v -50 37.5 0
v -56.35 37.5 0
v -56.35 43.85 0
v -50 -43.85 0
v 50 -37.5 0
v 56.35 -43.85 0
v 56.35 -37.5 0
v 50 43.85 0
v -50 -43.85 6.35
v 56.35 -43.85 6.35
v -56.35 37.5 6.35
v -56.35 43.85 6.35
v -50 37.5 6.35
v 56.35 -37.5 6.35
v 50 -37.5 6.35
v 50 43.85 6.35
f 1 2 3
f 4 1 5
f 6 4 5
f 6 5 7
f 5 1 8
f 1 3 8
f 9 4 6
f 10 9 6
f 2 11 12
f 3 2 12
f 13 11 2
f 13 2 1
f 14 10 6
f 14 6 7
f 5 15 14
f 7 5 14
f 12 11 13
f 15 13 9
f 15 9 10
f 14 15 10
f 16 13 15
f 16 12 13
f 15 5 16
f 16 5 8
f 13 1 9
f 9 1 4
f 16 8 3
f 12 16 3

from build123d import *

# Parameters (mm, degrees)
F0_W     = 100
F0_H     = 75
F0_W_2   = 41
F0_H_2   = 41
F0_H_3   = 6.35
F0_W_3   = 6.35
F1_DEPTH = 6.35


with BuildPart() as f1:
    # F0 (on Top) → F1 (new body)
    with BuildSketch(Plane.XY):
        Rectangle(F0_W, F0_H)
        Rectangle(F0_W_2, F0_H_2, mode=Mode.SUBTRACT)
        with Locations((0, 40.675)):
            Rectangle(F0_W, F0_H_3)
        with Locations((-53.175, 40.675)):
            Rectangle(F0_W_3, F0_H_3)
        with Locations((0, -40.675)):
            Rectangle(F0_W, F0_H_3)
        with Locations((53.175, -40.675)):
            Rectangle(F0_W_3, F0_H_3)
        Rectangle(F0_W_2, F0_H_2)
    extrude(amount=F1_DEPTH)


solid = f1.part
